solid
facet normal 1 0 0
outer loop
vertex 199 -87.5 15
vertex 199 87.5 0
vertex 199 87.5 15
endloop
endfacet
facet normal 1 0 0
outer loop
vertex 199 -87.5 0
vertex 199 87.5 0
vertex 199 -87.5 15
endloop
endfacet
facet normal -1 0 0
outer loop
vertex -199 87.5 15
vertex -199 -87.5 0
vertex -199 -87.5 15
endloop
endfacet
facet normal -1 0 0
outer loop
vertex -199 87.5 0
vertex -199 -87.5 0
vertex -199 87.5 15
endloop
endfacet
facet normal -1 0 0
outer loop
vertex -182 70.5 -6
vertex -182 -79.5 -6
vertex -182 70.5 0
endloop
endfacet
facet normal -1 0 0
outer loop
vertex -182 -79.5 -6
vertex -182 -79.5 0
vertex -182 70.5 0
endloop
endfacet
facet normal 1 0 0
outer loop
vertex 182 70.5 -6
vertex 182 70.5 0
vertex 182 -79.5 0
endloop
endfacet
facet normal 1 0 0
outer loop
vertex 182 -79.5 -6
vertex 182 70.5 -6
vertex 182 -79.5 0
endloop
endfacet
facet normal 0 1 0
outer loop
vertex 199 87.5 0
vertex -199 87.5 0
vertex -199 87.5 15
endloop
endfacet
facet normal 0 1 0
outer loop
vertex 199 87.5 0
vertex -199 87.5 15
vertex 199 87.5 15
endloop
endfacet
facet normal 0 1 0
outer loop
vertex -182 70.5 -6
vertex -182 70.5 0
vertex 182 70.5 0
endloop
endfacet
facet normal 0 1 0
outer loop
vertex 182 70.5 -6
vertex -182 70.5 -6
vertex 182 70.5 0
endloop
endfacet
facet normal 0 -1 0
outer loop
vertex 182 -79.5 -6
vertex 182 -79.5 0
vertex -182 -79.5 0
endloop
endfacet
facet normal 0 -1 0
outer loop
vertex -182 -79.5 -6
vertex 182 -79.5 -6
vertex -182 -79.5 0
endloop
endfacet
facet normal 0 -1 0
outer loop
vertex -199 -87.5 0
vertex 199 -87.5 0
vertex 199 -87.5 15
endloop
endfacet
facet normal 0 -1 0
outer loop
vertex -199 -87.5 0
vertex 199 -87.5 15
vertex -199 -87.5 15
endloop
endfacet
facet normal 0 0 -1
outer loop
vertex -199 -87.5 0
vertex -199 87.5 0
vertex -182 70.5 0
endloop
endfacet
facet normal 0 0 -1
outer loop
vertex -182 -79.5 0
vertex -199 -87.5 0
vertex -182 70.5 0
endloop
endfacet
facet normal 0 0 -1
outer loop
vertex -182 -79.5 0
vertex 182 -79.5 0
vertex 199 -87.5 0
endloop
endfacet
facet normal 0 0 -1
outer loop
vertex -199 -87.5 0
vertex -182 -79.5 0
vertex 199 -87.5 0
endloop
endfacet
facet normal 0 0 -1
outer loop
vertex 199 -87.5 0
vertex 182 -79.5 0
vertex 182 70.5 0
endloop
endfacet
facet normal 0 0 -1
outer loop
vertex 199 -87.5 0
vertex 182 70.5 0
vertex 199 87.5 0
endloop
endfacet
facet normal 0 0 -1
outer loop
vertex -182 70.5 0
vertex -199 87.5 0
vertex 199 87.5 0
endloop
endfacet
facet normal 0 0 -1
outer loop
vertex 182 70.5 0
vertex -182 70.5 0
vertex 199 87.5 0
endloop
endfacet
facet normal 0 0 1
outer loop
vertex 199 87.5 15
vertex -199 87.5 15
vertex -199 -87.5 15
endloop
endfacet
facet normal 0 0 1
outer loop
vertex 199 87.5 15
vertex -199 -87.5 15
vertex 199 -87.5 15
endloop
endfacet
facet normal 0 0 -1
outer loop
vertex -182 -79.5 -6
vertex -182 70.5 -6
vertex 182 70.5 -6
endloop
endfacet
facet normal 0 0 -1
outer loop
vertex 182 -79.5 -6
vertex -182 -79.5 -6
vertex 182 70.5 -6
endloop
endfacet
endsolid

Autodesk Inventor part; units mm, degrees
ref_plane "YZ Plane" through (0, 0, 0) normal (1, 0, 0) x (0, 1, 0)
ref_plane "XZ Plane" through (0, 0, 0) normal (0, 1, 0) x (-1, 0, 0)
ref_plane "XY Plane" through (0, 0, 0) normal (0, 0, 1) x (1, 0, 0)
sketch "Skizze1" plane through (0, 0, 0) normal (0, 0, 1) x (1, 0, 0)
  line L0 (199, -87.5) -> (-199, -87.5)
  line L1 (-199, -87.5) -> (-199, 87.5)
  line L2 (-199, 87.5) -> (199, 87.5)
  line L3 (199, 87.5) -> (199, -87.5)
  line L4 (199, -87.5) -> (-199, 87.5) construction
  line L5 (-199, -87.5) -> (199, 87.5) construction
  line L6 (-182, 70.5) -> (182, 70.5)
  line L7 (182, 70.5) -> (182, -79.5)
  line L8 (182, -79.5) -> (-182, -79.5)
  line L9 (-182, -79.5) -> (-182, 70.5)
  line L10 (-182, 70.5) -> (182, -79.5) construction
  line L11 (182, 70.5) -> (-182, -79.5) construction
  point P0 (0, 0)
  point P1 (0, -4.5)
  point P2 (0, -4.5)
  point P3 (0, 0)
  dimension "d0" = 175
  dimension "d1" = 398
  dimension "d2" = 8
  dimension "d3" = 17
  dimension "d4" = 17
extrude "Extrusion1" add sketch "Skizze1" along normal blind 15 contours L0 L1 L2 L3 | L6 L7 L8 L9
extrude "Extrusion2" add sketch "Skizze1" against normal blind 6 contours L6 L7 L8 L9
equation "\"d1\" = case_width - 2 * gap_air"
equation "\"d5\" = inner_thickness"
equation "\"d7\" = mdf_thickness"
equation "\"kg_thickness\" = 4.9"
equation "\"ht_thickness\" = 1.9"
equation "\"case_thickness\" = 18"
equation "\"inner_thickness\" = 15"
equation "\"gap_fit\" = 0.1"
equation "\"gap_slide\" = 0.2"
equation "\"gap_air\" = 1"
equation "\"bore_diameter\" = 73"
equation "\"mdf_thickness\" = 6"
equation "\"tape_width\" = 15"
equation "\"tape_thickness\" = 3"
equation "\"inner_depth\" = 255"
equation "\"case_width\" = 400"
properties part number "Front_Elektronik"
